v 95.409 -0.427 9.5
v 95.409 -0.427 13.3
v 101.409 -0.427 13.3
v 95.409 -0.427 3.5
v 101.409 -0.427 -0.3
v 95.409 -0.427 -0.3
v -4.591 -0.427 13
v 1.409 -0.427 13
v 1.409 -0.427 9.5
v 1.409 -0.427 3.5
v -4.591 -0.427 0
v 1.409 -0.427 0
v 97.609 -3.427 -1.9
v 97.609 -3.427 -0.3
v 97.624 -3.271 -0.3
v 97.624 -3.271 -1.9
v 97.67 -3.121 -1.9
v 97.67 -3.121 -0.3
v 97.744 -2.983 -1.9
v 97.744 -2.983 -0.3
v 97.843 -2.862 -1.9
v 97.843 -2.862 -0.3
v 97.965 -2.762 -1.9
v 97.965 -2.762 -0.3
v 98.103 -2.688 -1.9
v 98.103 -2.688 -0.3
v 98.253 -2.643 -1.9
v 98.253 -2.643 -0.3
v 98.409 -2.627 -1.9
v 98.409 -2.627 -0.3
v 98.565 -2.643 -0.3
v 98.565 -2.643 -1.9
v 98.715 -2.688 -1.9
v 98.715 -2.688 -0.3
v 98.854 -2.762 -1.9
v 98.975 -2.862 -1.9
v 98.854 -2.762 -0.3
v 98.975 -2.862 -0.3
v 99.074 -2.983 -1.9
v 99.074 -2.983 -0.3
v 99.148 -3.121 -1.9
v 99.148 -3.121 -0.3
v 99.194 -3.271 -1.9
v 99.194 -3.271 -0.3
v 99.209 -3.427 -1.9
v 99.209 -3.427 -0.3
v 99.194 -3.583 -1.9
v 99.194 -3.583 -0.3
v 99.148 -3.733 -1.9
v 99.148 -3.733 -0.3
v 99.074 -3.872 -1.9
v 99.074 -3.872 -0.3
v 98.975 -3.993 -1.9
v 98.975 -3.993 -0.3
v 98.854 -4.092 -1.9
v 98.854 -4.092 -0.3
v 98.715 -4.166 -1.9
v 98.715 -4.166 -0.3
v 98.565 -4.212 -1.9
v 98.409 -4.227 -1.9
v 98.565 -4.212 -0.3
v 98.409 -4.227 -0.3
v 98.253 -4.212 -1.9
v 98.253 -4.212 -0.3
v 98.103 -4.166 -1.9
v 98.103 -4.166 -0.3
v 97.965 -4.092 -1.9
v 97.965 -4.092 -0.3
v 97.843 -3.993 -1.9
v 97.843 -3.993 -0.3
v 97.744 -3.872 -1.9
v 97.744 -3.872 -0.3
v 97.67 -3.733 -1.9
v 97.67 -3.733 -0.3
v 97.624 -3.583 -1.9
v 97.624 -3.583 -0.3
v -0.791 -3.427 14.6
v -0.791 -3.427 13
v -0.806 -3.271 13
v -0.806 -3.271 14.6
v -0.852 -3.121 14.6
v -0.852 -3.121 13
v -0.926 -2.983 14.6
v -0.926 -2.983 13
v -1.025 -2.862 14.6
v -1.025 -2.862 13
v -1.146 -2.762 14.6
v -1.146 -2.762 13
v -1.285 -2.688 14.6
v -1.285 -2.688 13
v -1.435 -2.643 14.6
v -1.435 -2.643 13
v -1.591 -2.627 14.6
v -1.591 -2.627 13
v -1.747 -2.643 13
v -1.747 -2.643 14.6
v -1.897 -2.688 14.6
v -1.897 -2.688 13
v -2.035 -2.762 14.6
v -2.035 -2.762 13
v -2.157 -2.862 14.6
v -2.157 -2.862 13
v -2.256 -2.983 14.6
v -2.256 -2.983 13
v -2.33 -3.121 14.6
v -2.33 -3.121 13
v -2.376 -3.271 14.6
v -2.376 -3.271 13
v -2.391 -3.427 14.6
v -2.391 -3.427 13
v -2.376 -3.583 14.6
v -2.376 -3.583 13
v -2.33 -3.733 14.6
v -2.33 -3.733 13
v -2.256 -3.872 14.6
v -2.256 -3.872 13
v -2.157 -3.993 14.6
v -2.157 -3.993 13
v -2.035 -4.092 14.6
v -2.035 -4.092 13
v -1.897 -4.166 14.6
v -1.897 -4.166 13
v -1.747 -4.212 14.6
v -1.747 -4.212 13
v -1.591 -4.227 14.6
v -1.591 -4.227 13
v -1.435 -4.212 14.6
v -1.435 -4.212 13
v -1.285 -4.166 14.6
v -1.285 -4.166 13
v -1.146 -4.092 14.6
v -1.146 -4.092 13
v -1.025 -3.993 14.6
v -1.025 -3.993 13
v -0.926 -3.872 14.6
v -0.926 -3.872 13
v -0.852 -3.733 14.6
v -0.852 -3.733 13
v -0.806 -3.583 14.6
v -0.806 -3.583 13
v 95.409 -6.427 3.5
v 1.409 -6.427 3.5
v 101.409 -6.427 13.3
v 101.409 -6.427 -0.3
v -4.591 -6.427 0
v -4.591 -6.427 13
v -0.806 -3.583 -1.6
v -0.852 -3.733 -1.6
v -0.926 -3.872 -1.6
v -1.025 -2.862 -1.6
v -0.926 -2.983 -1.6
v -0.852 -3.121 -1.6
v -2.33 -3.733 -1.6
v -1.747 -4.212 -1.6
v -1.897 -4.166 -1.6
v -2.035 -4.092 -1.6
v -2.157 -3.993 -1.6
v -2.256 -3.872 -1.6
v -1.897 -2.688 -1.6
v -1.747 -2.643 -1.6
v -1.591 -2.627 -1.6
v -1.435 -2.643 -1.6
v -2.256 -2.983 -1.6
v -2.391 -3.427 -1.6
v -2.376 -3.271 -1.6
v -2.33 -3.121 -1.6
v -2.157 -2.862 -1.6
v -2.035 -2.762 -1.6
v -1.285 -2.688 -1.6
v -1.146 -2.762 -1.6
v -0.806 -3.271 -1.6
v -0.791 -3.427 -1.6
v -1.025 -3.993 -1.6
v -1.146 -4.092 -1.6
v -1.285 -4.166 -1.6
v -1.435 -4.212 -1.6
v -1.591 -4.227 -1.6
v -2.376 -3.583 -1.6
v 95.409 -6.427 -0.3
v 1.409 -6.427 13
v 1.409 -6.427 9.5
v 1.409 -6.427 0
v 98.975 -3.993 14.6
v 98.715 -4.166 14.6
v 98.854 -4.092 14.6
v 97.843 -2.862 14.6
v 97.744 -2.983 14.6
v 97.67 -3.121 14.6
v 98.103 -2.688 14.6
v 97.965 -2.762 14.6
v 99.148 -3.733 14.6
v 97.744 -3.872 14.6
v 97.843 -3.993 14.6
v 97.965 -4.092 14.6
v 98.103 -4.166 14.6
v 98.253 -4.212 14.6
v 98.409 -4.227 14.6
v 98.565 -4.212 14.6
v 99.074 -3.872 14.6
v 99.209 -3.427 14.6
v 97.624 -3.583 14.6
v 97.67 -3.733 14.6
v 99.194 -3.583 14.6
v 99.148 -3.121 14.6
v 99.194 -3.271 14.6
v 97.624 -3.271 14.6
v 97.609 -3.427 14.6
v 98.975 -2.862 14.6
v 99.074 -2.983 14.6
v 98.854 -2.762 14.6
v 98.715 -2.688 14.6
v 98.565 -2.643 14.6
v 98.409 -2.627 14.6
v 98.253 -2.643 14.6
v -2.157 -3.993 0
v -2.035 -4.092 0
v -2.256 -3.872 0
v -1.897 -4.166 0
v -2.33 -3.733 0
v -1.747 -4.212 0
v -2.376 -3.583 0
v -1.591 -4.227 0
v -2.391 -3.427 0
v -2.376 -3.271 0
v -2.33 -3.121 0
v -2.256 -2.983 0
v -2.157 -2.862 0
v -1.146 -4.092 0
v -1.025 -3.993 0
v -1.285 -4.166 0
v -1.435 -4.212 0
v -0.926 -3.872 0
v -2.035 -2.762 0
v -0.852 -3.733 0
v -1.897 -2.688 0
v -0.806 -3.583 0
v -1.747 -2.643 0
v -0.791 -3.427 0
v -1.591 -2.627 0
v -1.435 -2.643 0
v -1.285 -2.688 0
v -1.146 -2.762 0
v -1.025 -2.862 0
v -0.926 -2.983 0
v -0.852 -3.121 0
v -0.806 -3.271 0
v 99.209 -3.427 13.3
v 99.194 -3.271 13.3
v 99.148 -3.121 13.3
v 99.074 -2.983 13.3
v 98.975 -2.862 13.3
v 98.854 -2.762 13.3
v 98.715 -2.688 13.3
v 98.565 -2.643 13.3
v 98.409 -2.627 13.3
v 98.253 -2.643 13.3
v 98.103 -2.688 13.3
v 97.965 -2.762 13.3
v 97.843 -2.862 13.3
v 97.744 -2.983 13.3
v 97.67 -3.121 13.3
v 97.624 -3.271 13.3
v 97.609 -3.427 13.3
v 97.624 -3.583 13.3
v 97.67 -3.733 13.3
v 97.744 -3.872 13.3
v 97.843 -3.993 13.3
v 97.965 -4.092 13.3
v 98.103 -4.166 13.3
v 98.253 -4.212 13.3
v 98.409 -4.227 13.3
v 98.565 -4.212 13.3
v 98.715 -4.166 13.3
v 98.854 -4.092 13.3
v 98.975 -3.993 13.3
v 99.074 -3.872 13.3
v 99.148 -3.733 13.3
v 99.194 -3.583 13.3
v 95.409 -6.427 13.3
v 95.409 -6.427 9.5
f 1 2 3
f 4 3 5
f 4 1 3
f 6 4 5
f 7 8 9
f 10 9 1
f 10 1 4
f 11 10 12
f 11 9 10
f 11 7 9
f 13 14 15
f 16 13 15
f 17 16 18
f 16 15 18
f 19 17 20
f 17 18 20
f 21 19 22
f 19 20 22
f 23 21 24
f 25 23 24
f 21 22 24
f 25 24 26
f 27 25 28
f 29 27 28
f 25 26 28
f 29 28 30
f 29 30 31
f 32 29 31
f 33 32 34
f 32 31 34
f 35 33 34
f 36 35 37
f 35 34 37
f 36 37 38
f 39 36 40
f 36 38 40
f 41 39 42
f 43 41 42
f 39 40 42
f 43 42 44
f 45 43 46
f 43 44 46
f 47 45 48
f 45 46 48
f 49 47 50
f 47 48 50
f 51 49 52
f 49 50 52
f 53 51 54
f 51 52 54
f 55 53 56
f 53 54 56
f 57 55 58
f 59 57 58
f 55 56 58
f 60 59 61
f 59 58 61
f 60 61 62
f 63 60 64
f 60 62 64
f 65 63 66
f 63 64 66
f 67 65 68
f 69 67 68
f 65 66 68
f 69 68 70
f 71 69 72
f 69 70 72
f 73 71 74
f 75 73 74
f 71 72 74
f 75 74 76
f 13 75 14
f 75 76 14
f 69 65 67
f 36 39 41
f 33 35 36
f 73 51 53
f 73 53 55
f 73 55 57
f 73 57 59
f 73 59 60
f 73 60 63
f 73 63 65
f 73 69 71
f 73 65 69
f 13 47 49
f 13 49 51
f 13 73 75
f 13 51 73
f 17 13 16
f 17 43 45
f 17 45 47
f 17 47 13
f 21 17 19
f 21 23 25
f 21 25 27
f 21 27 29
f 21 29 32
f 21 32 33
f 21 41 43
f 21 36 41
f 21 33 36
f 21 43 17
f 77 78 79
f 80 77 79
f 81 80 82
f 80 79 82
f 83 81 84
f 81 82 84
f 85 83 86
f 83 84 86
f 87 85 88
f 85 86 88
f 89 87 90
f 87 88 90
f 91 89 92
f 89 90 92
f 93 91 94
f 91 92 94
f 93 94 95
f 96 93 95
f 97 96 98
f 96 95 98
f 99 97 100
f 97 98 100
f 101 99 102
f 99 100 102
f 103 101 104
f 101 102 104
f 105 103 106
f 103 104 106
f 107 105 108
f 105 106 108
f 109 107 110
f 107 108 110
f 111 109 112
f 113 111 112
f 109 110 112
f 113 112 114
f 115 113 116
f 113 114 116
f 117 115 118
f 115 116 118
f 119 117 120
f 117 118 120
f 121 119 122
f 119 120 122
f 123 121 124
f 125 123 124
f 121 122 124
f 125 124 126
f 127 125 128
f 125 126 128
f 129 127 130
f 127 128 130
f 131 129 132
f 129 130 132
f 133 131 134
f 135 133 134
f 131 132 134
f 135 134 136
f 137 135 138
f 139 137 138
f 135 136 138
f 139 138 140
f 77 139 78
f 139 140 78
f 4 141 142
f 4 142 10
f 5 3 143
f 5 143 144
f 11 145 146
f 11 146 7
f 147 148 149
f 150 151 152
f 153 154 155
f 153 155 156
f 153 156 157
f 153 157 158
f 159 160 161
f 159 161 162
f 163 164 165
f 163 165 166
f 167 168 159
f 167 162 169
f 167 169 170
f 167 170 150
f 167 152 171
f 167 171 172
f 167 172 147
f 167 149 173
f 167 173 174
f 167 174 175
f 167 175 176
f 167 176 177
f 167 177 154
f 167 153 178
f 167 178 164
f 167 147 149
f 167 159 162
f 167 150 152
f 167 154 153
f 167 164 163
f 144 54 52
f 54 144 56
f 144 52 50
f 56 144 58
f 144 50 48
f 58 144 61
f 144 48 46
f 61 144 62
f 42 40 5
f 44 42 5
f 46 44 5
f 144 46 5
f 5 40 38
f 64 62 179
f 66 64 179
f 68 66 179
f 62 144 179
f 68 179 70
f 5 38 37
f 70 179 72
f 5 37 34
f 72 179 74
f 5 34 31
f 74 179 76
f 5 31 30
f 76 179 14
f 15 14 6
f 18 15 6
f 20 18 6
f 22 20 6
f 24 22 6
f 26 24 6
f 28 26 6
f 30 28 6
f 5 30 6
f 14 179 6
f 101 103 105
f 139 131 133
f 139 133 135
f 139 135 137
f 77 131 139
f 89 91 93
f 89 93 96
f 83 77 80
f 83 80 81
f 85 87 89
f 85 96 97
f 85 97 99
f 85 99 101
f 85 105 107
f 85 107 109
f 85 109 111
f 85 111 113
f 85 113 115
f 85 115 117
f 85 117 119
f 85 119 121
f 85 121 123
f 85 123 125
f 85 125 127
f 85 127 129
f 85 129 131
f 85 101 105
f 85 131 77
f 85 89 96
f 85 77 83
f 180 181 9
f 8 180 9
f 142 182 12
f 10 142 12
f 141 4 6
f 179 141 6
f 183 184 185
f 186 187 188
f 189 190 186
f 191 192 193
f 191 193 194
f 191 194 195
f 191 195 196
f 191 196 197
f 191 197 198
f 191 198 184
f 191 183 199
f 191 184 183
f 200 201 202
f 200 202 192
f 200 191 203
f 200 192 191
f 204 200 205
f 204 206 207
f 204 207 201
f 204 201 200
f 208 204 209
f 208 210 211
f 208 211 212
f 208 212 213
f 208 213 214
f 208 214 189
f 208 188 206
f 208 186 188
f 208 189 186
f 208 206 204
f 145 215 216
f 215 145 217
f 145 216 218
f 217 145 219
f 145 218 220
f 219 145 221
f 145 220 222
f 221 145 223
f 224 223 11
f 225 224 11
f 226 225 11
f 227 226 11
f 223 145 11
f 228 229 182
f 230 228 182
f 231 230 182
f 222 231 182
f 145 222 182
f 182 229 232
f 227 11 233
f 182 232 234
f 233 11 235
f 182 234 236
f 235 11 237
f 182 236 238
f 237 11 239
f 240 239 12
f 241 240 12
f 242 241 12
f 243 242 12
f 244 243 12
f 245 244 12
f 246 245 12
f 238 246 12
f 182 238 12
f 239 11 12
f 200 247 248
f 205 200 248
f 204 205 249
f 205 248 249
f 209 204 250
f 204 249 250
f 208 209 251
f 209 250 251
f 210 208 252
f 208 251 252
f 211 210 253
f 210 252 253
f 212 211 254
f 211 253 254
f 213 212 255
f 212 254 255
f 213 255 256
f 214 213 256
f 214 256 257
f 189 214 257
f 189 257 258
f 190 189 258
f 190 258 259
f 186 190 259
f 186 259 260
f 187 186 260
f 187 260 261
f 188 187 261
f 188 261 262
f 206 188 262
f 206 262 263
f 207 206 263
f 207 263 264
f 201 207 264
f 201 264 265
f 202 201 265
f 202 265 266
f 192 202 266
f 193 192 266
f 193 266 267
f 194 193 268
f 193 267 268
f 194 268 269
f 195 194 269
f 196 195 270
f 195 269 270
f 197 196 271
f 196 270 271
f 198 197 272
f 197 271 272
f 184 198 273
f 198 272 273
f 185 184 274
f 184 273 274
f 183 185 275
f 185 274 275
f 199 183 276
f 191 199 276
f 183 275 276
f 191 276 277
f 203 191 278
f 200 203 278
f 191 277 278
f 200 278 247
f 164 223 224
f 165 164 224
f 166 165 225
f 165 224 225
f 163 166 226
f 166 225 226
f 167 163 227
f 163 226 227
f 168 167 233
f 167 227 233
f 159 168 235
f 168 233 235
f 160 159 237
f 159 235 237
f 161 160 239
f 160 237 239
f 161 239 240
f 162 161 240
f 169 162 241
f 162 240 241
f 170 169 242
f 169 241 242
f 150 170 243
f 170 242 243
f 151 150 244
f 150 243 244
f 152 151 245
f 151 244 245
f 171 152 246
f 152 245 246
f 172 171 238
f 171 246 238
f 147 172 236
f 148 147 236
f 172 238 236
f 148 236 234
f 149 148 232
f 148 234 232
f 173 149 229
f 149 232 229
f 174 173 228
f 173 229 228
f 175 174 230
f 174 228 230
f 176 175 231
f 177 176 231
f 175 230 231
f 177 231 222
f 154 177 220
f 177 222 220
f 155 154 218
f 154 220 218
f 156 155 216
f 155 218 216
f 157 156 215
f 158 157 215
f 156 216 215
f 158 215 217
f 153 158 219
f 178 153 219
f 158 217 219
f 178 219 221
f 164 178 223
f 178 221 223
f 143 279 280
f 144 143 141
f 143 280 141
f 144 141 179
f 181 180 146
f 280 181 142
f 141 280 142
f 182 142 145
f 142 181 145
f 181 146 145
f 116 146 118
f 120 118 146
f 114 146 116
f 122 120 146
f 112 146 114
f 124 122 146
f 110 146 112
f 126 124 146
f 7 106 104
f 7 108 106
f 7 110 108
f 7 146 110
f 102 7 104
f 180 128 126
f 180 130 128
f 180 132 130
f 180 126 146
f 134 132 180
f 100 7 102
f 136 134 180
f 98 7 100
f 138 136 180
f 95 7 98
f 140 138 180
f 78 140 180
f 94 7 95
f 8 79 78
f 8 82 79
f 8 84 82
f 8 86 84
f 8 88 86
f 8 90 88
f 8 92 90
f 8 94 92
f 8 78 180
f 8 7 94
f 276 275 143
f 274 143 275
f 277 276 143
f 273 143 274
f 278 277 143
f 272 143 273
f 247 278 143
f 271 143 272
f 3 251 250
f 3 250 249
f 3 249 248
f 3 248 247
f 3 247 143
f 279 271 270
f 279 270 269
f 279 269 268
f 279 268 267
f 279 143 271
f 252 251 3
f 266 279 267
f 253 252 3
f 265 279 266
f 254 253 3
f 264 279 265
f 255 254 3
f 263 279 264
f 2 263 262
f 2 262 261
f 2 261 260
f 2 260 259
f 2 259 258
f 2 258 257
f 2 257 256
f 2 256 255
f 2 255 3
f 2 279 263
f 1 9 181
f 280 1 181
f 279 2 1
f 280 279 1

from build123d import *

# Parameters (mm, degrees)
SKETCH_1_W      = 6
SKETCH_1_H      = 6
EXTRUDE_1_DEPTH = 13
SKETCH_3_R      = 0.8
EXTRUDE_3_DEPTH = 1.6
SKETCH_4_W      = 6
SKETCH_4_H      = 3
EXTRUDE_4_DEPTH = 94
SKETCH_5_W      = 13.6
SKETCH_5_H      = 6
EXTRUDE_5_DEPTH = 6
SKETCH_2_R      = 0.8
EXTRUDE_2_DEPTH = 1.6
SKETCH_7_R      = 0.8
EXTRUDE_6_DEPTH = 1.6


with BuildPart() as part:
    # 草图1 → 凸台-拉伸1 (new body)
    with BuildSketch(Plane.XY):
        with Locations((-1.59089175, -3.42724845)):
            Rectangle(SKETCH_1_W, SKETCH_1_H)
    extrude(amount=EXTRUDE_1_DEPTH)

    # 草图3 → 凸台-拉伸3 (add)
    with BuildSketch(Plane(origin=(0, 0, 0), x_dir=(-1, 0, 0), z_dir=(0, 0, -1))):
        with Locations((1.59089175, -3.42724845)):
            Circle(SKETCH_3_R)
    extrude(amount=EXTRUDE_3_DEPTH)

    # 草图4 → 凸台-拉伸4 (add)
    with BuildSketch(Plane(origin=(1.40910825, 0, 0), x_dir=(0, 0, -1), z_dir=(1, 0, 0))):
        with Locations((-6.5, -4.92724845)):
            Rectangle(SKETCH_4_W, SKETCH_4_H)
        with Locations((-6.5, -1.92724845)):
            Rectangle(SKETCH_4_W, SKETCH_4_H)
    extrude(amount=EXTRUDE_4_DEPTH)

    # 草图5 → 凸台-拉伸5 (add)
    with BuildSketch(Plane(origin=(95.40910825, 0, 0), x_dir=(0, 0, -1), z_dir=(1, 0, 0))):
        with Locations((-6.5, -3.42724845)):
            Rectangle(SKETCH_5_W, SKETCH_5_H)
    extrude(amount=EXTRUDE_5_DEPTH)

    # 草图2 → 凸台-拉伸2 (add)
    with BuildSketch(Plane.XY.offset(13)):
        with Locations((-1.59089175, -3.42724845)):
            Circle(SKETCH_2_R)
        with Locations((98.40910825, -3.42724845)):
            Circle(SKETCH_2_R)
    extrude(amount=EXTRUDE_2_DEPTH)

    # 草图7 → 凸台-拉伸6 (add)
    with BuildSketch(Plane(origin=(0, 0, -0.3), x_dir=(-1, 0, 0), z_dir=(0, 0, -1))):
        with Locations((-98.40910825, -3.42724845)):
            Circle(SKETCH_7_R)
    extrude(amount=EXTRUDE_6_DEPTH)


solid = part.part
